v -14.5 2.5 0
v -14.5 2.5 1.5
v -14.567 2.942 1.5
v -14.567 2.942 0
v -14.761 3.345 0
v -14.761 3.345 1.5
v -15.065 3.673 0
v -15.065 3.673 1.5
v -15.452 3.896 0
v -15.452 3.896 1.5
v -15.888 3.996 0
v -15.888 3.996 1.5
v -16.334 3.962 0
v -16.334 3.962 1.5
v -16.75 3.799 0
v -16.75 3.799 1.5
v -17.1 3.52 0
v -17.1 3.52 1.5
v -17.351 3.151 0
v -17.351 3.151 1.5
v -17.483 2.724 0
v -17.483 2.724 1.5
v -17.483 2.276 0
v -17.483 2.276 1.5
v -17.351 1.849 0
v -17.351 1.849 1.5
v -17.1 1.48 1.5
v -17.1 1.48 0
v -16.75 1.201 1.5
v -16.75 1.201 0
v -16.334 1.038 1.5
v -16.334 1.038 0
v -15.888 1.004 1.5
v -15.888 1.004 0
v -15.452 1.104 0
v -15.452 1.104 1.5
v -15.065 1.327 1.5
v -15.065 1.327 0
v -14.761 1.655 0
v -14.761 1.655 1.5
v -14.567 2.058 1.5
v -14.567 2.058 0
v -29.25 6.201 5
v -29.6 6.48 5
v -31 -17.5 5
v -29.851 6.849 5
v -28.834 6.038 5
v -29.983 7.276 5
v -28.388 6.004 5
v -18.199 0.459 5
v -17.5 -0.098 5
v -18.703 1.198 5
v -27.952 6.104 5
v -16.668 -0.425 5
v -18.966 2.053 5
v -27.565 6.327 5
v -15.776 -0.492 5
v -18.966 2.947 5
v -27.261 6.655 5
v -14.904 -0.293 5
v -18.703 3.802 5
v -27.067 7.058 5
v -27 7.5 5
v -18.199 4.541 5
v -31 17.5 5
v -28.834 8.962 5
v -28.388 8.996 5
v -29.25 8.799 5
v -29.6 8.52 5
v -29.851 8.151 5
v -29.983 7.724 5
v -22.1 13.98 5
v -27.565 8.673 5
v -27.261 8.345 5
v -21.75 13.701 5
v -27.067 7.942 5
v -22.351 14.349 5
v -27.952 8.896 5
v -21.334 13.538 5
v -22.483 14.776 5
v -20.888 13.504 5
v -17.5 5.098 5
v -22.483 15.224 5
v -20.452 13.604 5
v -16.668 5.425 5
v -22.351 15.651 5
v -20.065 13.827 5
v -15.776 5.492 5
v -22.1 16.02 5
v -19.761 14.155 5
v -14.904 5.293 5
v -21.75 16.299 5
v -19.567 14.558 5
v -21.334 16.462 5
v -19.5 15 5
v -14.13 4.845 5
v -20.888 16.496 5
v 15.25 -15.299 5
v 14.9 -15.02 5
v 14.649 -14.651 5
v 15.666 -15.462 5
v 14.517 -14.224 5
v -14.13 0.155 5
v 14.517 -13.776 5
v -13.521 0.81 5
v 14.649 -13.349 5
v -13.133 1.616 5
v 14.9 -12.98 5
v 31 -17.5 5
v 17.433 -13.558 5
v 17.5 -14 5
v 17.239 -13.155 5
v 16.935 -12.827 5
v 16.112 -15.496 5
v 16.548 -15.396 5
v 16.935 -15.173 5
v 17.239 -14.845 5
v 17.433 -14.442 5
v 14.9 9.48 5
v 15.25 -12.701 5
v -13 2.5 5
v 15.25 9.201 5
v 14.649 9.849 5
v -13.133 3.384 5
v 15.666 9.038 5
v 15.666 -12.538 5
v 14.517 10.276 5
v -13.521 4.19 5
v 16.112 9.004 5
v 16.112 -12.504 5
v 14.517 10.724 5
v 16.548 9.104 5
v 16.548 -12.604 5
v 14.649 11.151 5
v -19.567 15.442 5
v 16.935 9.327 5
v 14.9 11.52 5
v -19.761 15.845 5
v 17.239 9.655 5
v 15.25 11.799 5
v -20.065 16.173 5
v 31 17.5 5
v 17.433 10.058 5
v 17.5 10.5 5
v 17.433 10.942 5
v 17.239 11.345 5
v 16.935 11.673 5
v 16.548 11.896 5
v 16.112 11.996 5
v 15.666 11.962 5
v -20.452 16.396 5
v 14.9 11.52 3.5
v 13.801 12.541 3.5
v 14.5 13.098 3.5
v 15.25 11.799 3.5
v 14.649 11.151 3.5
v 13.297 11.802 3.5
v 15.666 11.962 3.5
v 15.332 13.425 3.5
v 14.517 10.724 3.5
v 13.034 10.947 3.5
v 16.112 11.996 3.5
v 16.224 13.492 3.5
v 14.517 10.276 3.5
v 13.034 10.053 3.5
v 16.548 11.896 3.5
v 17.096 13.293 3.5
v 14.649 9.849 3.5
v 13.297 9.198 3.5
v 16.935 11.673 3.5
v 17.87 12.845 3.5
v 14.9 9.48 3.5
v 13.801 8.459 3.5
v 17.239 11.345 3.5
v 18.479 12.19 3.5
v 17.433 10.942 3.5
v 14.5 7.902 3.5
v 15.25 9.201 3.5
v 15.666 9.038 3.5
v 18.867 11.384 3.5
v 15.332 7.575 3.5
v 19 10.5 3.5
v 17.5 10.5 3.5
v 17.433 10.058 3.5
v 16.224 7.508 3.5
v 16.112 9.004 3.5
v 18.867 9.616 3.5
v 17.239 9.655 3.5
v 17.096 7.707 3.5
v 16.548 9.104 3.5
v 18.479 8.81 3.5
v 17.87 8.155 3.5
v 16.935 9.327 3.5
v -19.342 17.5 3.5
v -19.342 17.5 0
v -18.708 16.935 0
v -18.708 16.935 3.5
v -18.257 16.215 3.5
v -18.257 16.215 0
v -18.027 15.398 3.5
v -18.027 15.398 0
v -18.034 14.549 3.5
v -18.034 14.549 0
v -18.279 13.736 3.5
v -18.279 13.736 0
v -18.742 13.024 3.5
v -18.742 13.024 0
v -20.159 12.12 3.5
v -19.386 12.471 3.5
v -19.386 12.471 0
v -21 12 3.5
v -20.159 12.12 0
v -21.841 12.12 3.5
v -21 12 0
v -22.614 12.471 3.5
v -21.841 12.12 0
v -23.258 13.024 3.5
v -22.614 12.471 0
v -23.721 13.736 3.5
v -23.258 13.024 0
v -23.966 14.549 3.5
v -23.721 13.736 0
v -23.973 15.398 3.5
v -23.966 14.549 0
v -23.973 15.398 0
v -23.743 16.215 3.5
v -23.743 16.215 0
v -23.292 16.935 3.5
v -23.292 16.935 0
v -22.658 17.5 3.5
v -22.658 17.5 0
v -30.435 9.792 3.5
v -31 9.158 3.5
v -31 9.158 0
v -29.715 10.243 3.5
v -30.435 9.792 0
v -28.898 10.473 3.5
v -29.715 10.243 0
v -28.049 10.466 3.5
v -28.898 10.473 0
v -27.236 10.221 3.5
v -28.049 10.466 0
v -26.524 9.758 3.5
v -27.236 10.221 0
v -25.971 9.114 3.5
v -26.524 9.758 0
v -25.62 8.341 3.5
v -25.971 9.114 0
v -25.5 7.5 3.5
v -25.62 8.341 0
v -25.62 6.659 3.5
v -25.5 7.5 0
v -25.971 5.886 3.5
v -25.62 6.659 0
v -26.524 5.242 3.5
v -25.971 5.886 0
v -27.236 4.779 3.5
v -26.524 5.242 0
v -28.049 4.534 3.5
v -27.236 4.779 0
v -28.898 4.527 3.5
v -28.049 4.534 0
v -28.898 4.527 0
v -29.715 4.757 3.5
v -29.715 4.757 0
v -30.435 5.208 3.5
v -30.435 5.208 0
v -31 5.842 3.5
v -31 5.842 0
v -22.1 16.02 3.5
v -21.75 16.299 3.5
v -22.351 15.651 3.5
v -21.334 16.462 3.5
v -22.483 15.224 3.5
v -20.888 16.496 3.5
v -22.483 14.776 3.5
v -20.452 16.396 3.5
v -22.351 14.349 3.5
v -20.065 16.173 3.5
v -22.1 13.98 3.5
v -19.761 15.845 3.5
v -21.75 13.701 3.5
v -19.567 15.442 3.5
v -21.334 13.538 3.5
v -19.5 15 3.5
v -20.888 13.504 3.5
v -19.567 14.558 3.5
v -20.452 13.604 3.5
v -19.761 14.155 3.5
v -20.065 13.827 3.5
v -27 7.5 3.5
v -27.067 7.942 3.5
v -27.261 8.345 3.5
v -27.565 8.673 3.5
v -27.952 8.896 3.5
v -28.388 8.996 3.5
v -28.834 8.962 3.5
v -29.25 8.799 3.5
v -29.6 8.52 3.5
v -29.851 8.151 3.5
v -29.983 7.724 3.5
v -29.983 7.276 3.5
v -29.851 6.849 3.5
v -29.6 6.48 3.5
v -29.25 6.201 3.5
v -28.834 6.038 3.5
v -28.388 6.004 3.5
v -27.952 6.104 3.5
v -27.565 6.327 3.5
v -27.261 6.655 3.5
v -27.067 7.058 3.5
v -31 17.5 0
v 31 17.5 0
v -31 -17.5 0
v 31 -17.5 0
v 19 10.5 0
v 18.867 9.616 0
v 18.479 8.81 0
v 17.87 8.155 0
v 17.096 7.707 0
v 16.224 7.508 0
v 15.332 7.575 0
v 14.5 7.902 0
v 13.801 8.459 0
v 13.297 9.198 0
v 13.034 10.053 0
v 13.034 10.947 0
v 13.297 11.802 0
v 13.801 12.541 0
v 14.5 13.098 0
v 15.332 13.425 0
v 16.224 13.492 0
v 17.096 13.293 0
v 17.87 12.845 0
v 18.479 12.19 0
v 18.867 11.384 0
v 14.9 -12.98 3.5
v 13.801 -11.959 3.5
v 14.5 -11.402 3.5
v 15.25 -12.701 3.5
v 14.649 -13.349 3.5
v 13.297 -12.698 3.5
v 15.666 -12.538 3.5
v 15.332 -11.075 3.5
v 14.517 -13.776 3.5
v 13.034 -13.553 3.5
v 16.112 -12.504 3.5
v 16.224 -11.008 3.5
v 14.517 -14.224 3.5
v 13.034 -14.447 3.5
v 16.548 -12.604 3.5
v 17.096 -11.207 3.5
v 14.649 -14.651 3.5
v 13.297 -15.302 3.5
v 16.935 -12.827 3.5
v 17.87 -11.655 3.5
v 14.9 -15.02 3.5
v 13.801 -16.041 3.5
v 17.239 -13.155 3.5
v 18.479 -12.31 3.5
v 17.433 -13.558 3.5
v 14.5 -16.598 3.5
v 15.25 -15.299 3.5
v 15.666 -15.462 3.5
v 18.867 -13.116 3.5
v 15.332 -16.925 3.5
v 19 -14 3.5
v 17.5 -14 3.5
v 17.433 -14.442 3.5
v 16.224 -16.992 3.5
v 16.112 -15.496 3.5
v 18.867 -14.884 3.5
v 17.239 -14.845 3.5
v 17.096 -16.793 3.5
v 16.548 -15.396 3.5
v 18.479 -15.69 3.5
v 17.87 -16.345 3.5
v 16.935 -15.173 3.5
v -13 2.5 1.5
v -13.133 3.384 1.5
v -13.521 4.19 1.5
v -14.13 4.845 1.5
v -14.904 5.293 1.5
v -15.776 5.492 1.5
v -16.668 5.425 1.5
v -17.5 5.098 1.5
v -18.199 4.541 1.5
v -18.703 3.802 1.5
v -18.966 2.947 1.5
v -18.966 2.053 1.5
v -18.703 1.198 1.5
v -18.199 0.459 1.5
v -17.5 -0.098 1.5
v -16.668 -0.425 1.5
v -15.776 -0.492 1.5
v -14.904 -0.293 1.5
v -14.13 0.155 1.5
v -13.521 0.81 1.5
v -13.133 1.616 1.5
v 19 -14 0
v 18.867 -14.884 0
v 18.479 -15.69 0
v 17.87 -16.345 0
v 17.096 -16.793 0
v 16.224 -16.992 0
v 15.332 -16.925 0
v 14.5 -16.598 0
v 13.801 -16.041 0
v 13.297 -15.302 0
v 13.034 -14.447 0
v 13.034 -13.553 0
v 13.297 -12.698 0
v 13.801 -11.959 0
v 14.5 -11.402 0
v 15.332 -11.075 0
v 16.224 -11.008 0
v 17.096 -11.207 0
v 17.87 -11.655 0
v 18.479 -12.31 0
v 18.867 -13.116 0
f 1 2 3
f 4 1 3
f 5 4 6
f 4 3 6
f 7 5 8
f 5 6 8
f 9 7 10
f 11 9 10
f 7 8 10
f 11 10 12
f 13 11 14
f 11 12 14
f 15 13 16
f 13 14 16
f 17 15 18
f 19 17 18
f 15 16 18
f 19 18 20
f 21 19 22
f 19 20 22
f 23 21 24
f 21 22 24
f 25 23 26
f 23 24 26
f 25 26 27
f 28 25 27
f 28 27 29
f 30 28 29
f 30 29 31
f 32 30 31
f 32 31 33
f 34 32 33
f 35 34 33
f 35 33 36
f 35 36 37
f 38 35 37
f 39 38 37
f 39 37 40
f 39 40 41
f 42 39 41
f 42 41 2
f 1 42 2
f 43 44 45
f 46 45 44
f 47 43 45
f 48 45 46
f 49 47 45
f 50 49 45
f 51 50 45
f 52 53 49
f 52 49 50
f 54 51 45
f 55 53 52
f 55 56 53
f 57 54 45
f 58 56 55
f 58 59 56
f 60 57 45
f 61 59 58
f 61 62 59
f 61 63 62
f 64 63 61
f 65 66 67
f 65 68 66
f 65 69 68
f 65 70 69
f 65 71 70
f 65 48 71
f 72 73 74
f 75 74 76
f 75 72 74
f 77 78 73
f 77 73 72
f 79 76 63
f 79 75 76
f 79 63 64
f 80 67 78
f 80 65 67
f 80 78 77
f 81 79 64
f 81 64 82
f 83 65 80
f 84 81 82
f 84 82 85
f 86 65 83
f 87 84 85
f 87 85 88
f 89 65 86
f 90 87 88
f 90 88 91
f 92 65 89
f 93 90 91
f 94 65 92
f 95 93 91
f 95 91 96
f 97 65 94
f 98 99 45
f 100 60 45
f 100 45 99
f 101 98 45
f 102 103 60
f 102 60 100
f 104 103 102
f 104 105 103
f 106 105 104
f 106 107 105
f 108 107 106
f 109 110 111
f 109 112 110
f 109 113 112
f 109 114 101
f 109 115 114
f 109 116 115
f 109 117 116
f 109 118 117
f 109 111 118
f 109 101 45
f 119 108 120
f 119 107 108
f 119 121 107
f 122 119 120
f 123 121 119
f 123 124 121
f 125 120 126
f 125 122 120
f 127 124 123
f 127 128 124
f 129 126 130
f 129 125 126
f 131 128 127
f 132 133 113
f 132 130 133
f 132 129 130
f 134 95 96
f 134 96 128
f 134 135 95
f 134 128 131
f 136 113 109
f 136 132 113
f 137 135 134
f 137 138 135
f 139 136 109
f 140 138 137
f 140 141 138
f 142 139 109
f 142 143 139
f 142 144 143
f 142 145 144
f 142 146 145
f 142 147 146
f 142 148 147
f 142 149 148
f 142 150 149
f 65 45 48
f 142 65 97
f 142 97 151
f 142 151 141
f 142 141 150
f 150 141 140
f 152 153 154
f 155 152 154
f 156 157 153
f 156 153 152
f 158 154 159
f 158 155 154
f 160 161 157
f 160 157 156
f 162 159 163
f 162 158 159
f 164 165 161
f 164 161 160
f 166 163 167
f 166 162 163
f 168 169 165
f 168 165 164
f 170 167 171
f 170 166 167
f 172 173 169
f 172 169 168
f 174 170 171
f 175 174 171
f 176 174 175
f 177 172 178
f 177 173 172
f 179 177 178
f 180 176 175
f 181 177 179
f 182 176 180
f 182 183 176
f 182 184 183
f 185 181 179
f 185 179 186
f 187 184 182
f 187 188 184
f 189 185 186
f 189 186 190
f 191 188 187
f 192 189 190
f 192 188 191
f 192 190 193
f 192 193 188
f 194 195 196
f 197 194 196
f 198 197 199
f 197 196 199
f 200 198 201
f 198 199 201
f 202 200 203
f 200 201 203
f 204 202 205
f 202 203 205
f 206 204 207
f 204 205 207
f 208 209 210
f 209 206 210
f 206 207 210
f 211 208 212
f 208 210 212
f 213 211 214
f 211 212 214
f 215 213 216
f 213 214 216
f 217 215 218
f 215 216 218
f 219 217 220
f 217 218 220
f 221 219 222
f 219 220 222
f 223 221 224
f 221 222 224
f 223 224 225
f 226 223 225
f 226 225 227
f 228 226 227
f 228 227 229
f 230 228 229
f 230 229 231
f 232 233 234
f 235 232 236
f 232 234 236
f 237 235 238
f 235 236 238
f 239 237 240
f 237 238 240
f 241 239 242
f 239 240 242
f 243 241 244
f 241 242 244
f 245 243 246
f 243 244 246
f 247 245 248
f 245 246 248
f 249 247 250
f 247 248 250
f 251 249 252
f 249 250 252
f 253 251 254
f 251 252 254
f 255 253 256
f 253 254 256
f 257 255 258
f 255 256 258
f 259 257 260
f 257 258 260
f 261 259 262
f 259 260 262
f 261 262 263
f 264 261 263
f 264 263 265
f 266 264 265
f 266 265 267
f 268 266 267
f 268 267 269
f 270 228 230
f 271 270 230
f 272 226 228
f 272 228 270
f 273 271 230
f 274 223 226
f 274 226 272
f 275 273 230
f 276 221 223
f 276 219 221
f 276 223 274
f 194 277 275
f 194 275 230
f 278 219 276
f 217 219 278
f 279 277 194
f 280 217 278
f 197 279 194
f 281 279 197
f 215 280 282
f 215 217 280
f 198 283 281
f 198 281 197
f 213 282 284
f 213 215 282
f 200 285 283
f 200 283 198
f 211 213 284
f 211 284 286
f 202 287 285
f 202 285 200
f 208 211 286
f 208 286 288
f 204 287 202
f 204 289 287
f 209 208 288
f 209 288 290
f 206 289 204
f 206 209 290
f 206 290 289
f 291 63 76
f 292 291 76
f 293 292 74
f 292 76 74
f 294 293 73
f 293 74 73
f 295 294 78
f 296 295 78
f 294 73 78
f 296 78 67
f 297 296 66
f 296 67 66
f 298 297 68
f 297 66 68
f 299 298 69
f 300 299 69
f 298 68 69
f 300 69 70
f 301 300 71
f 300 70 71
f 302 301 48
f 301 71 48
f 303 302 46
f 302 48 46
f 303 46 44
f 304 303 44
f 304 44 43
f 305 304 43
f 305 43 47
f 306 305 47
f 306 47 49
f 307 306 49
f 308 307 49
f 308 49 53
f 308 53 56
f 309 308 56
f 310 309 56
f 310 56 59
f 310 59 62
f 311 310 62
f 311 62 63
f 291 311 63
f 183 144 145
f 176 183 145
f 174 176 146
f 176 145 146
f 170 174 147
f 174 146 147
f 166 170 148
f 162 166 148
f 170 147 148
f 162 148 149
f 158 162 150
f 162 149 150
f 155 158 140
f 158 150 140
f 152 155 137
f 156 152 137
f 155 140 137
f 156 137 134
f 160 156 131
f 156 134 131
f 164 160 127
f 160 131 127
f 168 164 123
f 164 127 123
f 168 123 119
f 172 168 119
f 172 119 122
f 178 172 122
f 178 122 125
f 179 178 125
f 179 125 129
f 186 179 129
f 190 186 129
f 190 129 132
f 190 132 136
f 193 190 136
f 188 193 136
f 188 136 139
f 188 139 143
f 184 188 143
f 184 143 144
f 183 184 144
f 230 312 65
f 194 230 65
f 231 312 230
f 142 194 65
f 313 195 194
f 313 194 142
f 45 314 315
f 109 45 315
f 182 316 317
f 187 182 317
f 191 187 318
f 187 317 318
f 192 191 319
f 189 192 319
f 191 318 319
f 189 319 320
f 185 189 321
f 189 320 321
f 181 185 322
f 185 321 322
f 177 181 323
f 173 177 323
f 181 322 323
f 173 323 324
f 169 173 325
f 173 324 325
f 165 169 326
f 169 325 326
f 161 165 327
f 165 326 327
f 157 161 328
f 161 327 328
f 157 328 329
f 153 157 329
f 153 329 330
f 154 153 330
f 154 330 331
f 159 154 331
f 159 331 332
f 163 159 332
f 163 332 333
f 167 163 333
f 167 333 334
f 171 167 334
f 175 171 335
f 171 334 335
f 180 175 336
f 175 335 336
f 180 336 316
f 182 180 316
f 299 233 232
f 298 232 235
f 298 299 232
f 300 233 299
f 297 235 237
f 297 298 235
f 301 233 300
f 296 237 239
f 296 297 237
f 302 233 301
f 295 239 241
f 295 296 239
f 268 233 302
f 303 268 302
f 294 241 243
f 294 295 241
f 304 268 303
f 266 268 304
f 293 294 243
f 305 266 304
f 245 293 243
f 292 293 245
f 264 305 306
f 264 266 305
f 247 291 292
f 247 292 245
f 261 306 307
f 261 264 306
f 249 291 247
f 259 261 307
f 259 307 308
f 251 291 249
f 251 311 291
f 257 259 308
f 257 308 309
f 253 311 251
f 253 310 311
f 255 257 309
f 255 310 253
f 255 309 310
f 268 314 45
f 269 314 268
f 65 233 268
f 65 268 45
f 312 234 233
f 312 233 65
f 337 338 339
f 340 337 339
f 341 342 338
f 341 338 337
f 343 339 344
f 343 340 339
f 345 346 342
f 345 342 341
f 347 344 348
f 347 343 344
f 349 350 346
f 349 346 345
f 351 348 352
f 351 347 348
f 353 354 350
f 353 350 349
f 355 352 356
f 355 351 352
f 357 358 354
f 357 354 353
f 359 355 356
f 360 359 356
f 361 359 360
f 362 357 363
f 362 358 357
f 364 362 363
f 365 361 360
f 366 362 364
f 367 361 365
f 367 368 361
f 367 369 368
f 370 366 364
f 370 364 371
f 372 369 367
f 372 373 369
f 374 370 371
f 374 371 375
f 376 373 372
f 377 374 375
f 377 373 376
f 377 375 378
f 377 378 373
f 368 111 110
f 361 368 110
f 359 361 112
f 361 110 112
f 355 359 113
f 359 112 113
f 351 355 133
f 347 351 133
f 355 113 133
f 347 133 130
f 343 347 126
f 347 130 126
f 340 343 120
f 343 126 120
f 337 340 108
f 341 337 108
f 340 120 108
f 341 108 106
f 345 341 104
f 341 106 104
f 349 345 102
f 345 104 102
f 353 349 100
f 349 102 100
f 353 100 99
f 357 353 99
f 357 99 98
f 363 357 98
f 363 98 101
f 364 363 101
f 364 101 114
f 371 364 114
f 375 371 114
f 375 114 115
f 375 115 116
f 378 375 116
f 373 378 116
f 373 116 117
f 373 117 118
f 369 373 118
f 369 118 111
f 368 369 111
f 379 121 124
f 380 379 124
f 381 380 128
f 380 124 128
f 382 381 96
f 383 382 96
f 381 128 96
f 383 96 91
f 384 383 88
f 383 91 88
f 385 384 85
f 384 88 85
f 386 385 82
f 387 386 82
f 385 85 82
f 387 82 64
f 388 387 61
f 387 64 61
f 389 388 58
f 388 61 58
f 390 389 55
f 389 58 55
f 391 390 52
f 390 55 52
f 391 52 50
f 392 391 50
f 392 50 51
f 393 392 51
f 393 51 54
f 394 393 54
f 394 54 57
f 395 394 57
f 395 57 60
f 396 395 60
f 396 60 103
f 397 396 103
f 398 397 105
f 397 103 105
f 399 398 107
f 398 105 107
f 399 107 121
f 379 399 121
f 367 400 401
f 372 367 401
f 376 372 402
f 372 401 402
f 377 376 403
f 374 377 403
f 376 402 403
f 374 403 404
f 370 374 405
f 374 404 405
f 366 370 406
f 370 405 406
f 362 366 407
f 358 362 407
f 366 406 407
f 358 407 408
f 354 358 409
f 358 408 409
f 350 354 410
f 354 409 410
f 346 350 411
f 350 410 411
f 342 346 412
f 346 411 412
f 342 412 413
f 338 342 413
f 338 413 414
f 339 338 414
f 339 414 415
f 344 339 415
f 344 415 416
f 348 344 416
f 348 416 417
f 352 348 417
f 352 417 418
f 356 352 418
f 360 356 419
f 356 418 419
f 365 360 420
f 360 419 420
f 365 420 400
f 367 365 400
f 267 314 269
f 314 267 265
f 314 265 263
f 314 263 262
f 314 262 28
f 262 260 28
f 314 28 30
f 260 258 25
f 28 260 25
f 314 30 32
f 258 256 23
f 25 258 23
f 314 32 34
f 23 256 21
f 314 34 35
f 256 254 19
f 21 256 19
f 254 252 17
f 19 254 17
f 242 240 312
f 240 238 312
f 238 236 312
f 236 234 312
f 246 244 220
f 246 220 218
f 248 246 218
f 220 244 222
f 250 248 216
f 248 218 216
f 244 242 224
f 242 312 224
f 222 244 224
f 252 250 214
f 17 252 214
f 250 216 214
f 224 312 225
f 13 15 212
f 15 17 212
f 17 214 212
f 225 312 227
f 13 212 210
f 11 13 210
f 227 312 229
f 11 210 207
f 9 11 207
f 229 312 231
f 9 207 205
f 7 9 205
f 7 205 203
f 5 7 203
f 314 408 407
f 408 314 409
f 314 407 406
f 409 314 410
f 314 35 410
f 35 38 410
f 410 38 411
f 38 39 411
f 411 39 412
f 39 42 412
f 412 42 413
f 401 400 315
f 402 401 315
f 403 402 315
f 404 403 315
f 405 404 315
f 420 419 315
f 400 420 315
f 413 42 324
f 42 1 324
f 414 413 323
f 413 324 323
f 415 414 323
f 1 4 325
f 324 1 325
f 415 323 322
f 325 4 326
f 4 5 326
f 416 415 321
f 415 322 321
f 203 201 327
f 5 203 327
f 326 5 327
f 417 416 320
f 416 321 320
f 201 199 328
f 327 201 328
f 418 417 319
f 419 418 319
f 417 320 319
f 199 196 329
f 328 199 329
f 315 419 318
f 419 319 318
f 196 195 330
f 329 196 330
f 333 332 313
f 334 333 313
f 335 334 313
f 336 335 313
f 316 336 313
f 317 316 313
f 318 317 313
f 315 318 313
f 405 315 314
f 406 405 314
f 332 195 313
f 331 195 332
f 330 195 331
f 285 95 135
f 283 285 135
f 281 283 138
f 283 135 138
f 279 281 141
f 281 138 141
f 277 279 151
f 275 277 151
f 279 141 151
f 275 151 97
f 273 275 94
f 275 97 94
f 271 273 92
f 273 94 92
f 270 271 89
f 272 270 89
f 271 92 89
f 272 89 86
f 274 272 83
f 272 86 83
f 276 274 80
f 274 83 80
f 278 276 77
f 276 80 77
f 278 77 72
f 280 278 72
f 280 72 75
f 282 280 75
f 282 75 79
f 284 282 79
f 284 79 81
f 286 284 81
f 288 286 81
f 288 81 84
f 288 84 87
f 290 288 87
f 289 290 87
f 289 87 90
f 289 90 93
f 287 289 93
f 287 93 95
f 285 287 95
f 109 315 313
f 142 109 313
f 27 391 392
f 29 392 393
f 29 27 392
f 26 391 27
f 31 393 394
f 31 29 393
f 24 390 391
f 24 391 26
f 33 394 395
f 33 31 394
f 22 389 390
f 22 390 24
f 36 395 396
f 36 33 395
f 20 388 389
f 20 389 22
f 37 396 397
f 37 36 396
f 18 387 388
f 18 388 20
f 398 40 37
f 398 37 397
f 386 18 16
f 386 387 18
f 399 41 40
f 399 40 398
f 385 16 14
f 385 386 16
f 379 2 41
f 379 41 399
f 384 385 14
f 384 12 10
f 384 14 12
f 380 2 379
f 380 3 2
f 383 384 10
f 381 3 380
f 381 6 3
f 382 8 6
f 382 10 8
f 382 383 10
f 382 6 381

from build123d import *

# Parameters (mm, degrees)
F0_W      = 62
F0_H      = 35
F1_DEPTH  = 5
F2_R      = 1.5
F3_DEPTH  = 5
F4_R      = 3
F5_DEPTH  = 3.5
F6_R      = 3
F7_DEPTH  = 3.5
F8_R      = 1.5
F9_DEPTH  = 5
F10_R     = 1.5
F11_DEPTH = 5
F12_R     = 3
F13_DEPTH = 3.5


with BuildPart() as f1:
    # F0 (on Top) → F1 (new body)
    with BuildSketch(Plane.XY):
        Rectangle(F0_W, F0_H)
    extrude(amount=F1_DEPTH)

    # F2 (on face) → F3 (cut)
    with BuildSketch(Plane.XY.offset(5)):
        with Locations((-28.5, 7.5)):
            Circle(F2_R)
        with Locations((-21, 15)):
            Circle(F2_R)
    extrude(amount=-F3_DEPTH, mode=Mode.SUBTRACT)

    # F4 (on face) → F5 (cut)
    with BuildSketch(Plane(origin=(0, 0, 0), x_dir=(1, 0, 0), z_dir=(0, 0, -1))):
        with Locations((-28.5, -7.5)):
            Circle(F4_R)
        with Locations((-21, -15)):
            Circle(F4_R)
    extrude(amount=-F5_DEPTH, mode=Mode.SUBTRACT)

    # F6 (on face) → F7 (cut)
    with BuildSketch(Plane.XY.offset(5)):
        with Locations((-16, 2.5)):
            Circle(F6_R)
    extrude(amount=-F7_DEPTH, mode=Mode.SUBTRACT)

    # F8 (on face) → F9 (cut)
    with BuildSketch(Plane.XY.offset(1.5)):
        with Locations((-16, 2.5)):
            Circle(F8_R)
    extrude(amount=-F9_DEPTH, mode=Mode.SUBTRACT)

    # F10 (on face) → F11 (cut)
    with BuildSketch(Plane.XY.offset(5)):
        with Locations((16, 10.5)):
            Circle(F10_R)
        with Locations((16, -14)):
            Circle(F10_R)
    extrude(amount=-F11_DEPTH, mode=Mode.SUBTRACT)

    # F12 (on face) → F13 (cut)
    with BuildSketch(Plane(origin=(0, 0, 0), x_dir=(1, 0, 0), z_dir=(0, 0, -1))):
        with Locations((16, 14)):
            Circle(F12_R)
        with Locations((16, -10.5)):
            Circle(F12_R)
    extrude(amount=-F13_DEPTH, mode=Mode.SUBTRACT)


solid = f1.part
